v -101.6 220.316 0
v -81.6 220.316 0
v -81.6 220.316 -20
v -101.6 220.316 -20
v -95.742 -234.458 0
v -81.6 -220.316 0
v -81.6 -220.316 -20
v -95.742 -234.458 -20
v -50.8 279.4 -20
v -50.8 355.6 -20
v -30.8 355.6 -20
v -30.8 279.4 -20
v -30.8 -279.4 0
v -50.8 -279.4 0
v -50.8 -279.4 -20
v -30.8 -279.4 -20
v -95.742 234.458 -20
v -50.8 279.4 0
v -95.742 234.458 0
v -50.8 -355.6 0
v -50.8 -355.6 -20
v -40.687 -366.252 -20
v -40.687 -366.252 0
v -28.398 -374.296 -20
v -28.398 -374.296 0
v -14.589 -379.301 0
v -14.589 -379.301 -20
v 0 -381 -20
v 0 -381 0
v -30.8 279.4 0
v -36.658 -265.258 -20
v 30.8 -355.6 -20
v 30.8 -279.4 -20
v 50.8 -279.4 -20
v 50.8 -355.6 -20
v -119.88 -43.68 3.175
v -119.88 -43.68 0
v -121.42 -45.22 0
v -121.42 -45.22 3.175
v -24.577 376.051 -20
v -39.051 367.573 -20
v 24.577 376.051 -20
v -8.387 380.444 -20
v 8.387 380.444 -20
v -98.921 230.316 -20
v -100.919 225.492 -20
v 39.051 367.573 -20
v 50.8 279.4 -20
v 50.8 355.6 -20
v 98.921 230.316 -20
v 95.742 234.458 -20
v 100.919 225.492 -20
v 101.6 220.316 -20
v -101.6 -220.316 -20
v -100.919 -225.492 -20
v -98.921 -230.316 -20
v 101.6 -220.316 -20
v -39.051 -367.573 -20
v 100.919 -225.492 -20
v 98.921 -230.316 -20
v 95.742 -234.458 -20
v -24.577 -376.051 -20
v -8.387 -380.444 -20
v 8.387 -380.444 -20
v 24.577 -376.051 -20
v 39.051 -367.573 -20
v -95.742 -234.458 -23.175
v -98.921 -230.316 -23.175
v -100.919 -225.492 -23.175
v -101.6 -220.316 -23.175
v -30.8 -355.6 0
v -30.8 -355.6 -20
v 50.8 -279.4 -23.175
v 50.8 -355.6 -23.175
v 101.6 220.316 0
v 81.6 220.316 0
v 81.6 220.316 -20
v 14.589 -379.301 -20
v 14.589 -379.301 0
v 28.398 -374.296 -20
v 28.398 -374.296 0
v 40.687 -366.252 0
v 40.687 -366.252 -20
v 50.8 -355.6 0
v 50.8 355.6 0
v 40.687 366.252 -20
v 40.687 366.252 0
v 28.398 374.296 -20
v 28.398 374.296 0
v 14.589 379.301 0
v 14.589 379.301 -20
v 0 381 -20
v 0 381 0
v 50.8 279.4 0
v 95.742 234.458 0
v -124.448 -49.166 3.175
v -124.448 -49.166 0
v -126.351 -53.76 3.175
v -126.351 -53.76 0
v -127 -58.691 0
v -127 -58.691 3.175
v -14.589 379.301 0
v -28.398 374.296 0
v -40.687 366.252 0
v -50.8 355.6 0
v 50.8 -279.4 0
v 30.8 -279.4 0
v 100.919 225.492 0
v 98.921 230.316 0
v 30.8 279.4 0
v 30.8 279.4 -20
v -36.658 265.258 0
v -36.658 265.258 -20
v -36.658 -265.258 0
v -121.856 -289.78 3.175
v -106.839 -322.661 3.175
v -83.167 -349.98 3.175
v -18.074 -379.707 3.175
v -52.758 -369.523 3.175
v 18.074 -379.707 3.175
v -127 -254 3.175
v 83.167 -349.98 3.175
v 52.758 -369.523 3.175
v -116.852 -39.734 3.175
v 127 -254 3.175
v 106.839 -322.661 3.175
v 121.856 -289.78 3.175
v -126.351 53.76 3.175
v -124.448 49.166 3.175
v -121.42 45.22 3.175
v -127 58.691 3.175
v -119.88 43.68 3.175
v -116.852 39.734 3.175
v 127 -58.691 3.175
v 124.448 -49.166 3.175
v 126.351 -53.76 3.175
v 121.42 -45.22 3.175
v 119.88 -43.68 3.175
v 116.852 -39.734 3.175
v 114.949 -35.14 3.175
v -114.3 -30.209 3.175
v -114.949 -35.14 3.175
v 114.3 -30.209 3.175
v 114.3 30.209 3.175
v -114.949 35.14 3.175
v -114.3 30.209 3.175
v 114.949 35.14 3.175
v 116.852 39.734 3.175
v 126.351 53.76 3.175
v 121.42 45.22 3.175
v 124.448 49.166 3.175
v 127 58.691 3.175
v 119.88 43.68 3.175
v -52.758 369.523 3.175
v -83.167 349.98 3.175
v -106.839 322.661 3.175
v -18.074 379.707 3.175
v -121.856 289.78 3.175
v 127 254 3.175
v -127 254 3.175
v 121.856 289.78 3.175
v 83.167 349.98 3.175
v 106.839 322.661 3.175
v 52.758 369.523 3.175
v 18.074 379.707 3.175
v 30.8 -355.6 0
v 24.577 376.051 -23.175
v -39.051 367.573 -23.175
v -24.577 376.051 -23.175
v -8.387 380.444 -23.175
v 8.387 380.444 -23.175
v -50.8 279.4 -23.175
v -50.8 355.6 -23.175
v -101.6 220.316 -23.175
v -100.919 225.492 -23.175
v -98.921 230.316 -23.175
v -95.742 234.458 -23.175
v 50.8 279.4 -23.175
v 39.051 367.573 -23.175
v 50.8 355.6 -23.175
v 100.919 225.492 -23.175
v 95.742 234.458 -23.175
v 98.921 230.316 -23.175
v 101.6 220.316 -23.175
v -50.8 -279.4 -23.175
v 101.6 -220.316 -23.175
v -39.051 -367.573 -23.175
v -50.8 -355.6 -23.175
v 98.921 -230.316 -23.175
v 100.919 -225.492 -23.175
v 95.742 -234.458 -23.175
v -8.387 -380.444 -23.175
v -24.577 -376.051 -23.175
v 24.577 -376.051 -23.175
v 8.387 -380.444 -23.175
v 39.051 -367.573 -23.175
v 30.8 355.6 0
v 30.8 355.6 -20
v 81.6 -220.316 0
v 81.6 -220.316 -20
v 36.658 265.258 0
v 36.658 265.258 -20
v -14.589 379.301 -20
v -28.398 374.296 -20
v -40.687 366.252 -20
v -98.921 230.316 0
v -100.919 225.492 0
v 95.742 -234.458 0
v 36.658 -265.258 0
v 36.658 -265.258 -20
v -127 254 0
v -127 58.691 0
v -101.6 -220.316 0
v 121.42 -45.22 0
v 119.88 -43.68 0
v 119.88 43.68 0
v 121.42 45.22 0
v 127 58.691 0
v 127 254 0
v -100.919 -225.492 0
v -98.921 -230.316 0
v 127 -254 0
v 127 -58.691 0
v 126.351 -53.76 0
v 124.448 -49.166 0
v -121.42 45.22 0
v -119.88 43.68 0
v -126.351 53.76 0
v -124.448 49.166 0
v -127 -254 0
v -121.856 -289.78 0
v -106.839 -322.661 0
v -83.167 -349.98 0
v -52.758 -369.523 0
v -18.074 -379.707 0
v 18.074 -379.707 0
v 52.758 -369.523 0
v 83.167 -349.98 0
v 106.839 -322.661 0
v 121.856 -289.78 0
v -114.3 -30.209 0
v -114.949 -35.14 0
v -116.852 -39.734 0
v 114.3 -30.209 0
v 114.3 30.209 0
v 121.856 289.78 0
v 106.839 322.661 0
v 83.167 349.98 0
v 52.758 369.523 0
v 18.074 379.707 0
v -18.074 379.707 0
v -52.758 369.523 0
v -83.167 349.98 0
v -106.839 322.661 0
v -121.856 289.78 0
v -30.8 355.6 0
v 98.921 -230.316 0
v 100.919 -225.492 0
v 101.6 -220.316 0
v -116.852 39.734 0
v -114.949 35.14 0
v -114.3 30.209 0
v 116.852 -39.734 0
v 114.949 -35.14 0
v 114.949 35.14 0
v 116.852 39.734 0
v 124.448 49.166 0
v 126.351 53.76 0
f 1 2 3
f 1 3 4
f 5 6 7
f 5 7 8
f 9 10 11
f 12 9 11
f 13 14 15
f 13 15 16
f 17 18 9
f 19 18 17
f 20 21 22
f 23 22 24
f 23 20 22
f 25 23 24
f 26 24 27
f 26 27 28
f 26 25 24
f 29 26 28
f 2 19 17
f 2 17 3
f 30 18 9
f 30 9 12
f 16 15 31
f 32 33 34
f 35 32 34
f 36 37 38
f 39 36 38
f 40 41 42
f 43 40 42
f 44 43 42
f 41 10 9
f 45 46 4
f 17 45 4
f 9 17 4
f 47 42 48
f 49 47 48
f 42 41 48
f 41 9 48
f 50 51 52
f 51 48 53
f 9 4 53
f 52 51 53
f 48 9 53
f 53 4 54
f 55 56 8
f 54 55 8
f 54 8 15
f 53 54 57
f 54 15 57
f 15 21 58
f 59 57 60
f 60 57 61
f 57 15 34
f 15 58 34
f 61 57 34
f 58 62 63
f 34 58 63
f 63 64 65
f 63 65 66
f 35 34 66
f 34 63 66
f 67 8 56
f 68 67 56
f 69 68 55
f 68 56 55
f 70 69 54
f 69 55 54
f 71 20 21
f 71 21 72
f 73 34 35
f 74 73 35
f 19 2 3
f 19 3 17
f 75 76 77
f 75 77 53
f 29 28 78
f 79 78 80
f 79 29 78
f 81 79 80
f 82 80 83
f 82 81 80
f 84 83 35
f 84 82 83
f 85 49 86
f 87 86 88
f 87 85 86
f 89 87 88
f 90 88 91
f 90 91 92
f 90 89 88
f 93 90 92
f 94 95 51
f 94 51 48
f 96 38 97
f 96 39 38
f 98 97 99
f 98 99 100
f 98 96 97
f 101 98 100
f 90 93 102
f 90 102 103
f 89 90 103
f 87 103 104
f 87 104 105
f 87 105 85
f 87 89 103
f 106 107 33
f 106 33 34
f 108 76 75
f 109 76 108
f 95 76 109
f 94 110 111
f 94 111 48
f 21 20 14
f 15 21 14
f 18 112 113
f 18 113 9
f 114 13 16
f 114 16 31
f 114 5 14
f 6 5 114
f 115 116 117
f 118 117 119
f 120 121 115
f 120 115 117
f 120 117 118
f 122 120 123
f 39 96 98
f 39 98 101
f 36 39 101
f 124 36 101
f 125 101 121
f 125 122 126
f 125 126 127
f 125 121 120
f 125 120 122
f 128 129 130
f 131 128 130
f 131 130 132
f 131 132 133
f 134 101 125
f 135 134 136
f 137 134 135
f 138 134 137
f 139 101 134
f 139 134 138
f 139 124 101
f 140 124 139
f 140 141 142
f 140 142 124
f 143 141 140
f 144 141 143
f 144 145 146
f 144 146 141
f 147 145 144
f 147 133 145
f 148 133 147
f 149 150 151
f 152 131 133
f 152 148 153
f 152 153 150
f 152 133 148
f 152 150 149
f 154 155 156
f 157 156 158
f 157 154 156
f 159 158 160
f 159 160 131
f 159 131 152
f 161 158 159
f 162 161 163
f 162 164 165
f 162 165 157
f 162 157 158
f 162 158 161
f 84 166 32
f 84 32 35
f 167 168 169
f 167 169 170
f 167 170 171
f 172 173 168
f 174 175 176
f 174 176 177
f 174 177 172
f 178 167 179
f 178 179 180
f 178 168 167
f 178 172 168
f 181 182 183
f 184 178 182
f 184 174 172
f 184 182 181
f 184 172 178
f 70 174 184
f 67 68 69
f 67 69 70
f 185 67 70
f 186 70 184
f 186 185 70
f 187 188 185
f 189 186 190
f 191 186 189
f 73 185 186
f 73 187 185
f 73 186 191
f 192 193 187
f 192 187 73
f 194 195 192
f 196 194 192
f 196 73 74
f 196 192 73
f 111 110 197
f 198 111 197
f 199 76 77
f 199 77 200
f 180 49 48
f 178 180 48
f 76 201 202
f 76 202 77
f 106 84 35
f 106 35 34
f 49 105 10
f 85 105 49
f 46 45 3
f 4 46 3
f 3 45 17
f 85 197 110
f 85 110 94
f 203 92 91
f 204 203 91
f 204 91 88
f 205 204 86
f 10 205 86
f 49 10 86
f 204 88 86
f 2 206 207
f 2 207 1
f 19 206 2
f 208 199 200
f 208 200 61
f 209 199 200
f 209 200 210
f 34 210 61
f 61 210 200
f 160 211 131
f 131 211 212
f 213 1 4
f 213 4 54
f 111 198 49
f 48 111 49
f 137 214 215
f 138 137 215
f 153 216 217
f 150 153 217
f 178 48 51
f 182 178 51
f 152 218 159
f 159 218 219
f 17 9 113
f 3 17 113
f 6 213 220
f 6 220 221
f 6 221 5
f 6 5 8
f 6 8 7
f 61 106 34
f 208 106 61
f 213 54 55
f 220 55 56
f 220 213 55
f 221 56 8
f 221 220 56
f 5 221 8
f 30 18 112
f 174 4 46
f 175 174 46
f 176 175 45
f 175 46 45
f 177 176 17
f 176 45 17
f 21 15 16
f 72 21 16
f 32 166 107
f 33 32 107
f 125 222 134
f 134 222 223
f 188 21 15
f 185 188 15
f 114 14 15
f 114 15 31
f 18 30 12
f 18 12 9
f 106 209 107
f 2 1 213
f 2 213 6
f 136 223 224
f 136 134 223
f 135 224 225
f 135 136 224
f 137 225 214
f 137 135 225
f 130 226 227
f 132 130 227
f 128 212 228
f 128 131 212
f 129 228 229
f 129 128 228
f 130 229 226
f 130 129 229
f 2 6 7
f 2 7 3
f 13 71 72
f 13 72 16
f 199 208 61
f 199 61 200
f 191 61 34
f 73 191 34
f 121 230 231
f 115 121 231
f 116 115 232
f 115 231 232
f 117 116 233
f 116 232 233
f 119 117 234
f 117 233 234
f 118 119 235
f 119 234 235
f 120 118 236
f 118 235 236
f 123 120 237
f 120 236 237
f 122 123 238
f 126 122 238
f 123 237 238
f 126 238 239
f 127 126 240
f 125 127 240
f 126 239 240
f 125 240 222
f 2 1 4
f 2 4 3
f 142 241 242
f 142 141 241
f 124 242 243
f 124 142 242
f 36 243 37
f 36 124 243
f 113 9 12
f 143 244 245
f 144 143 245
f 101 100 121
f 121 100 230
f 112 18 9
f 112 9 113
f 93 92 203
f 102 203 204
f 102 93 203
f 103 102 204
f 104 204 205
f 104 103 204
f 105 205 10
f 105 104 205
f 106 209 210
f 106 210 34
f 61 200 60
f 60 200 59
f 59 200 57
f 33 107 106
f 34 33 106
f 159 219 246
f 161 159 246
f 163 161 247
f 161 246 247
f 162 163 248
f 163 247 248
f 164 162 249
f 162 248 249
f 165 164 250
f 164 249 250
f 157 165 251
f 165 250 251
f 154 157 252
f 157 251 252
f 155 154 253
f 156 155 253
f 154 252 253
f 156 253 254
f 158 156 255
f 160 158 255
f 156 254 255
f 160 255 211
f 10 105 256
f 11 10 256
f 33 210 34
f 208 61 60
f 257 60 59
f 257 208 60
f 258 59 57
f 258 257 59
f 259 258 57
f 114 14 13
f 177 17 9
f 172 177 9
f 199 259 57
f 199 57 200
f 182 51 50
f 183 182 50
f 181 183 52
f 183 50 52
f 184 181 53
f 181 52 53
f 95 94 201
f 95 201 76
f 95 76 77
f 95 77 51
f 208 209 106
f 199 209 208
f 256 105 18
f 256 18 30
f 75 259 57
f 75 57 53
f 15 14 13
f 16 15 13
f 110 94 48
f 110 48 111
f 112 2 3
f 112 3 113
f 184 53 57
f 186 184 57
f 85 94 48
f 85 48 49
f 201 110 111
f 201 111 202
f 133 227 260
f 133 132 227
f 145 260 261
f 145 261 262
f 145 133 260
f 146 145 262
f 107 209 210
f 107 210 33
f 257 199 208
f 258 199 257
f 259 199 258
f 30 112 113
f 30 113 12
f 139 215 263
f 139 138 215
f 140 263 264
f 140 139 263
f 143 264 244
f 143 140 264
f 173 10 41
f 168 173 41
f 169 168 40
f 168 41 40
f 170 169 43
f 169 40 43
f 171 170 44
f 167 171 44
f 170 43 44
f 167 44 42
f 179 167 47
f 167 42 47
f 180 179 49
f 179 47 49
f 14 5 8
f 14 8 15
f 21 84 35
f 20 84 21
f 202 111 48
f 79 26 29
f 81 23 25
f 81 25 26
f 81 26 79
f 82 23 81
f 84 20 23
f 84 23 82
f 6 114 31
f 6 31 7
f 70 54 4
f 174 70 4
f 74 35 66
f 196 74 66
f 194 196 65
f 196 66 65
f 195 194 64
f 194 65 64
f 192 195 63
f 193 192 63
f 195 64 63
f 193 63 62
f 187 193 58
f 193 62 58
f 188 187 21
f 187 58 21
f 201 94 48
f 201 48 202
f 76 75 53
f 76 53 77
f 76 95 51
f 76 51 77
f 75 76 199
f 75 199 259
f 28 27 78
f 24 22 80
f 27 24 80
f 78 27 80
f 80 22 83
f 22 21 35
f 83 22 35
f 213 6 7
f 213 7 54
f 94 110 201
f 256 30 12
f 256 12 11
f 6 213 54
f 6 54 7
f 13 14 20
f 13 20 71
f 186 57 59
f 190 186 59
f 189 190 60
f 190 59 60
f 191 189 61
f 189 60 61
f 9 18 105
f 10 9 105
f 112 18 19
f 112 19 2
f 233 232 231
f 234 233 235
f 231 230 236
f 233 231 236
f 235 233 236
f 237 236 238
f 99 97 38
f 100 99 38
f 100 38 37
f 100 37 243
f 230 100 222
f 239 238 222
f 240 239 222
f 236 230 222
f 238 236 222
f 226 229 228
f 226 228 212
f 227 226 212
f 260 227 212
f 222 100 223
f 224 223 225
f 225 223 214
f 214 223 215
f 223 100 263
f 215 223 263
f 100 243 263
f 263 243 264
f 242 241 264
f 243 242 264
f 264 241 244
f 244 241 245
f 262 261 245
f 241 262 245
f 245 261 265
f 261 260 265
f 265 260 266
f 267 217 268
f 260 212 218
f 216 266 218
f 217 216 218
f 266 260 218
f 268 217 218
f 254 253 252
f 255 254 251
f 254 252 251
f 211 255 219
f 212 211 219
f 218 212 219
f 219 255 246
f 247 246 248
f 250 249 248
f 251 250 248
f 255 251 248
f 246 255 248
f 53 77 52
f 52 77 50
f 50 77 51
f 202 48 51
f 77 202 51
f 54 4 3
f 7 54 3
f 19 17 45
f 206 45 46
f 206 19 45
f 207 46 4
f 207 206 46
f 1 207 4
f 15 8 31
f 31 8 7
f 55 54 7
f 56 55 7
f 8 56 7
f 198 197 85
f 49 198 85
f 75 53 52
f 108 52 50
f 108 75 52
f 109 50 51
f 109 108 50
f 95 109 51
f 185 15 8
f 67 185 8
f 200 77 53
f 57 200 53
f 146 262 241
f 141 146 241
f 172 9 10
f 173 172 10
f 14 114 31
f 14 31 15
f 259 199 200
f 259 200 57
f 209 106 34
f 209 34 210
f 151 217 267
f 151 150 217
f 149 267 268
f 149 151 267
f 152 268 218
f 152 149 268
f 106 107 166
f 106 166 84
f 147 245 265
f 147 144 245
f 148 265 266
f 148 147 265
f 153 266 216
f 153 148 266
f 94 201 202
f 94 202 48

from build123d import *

# Parameters (mm, degrees)
F0_W     = 20
F0_H     = 76.2
F1_DEPTH = 3.175
F2_DEPTH = 20
F3_DEPTH = 20
F4_R     = 19.05
F5_W     = 20
F5_H     = 76.2
F6_DEPTH = 3.175


with BuildPart() as f1:
    # F0 (on Top) → F1 (new body)
    with BuildSketch(Plane.XY):
        with BuildLine():
            ThreePointArc((0, 381), (-28.3980633142, 374.2961266285), (-50.8, 355.6))
            Line((-50.8, 355.6), (-30.8, 355.6))
            Line((-30.8, 355.6), (30.8, 355.6))
            Line((30.8, 355.6), (50.8, 355.6))
            ThreePointArc((50.8, 355.6), (28.3980633142, 374.2961266285), (0, 381))
        make_face()
        with BuildLine():
            Line((-50.8, 279.4), (-50.8, 355.6))
            ThreePointArc((-50.8, 355.6), (-28.3980633142, 374.2961266285), (0, 381))
            ThreePointArc((0, 381), (-89.8025612107, 343.8025612107), (-127, 254))
            Line((-127, 254), (-127, 50.8))
            Line((-127, 50.8), (-114.3, 38.1))
            Line((-114.3, 38.1), (-114.3, 0))
            Line((-114.3, 0), (-114.3, -38.1))
            Line((-114.3, -38.1), (-127, -50.8))
            Line((-127, -50.8), (-127, -254))
            ThreePointArc((-127, -254), (-89.8025612107, -343.8025612107), (0, -381))
            ThreePointArc((0, -381), (-28.3980633142, -374.2961266285), (-50.8, -355.6))
            Line((-50.8, -355.6), (-50.8, -279.4))
            Line((-50.8, -279.4), (-95.7421356237, -234.4578643763))
            ThreePointArc((-95.7421356237, -234.4578643763), (-100.0775906502, -227.9693973998), (-101.6, -220.3157287525))
            Line((-101.6, -220.3157287525), (-101.6, 0))
            Line((-101.6, 0), (-101.6, 220.3157287525))
            ThreePointArc((-101.6, 220.3157287525), (-100.0775906502, 227.9693973998), (-95.7421356237, 234.4578643763))
            Line((-95.7421356237, 234.4578643763), (-50.8, 279.4))
        make_face()
        with BuildLine():
            ThreePointArc((127, 254), (89.8025612107, 343.8025612107), (0, 381))
            ThreePointArc((0, 381), (28.3980633142, 374.2961266285), (50.8, 355.6))
            Line((50.8, 355.6), (50.8, 279.4))
            Line((50.8, 279.4), (95.7421356237, 234.4578643763))
            ThreePointArc((95.7421356237, 234.4578643763), (100.0775906502, 227.9693973998), (101.6, 220.3157287525))
            Line((101.6, 220.3157287525), (101.6, 0))
            Line((101.6, 0), (101.6, -220.3157287525))
            ThreePointArc((101.6, -220.3157287525), (100.0775906502, -227.9693973998), (95.7421356237, -234.4578643763))
            Line((95.7421356237, -234.4578643763), (50.8, -279.4))
            Line((50.8, -279.4), (50.8, -355.6))
            ThreePointArc((50.8, -355.6), (28.3980633142, -374.2961266285), (0, -381))
            ThreePointArc((0, -381), (89.8025612107, -343.8025612107), (127, -254))
            Line((127, -254), (127, -50.8))
            Line((127, -50.8), (114.3, -38.1))
            Line((114.3, -38.1), (114.3, 0))
            Line((114.3, 0), (114.3, 38.1))
            Line((114.3, 38.1), (127, 50.8))
            Line((127, 50.8), (127, 254))
        make_face()
        with BuildLine():
            Line((-30.8, -355.6), (-50.8, -355.6))
            ThreePointArc((-50.8, -355.6), (-28.3980633142, -374.2961266285), (0, -381))
            ThreePointArc((0, -381), (28.3980633142, -374.2961266285), (50.8, -355.6))
            Line((50.8, -355.6), (30.8, -355.6))
            Line((30.8, -355.6), (-30.8, -355.6))
        make_face()
        Polygon((30.8, 355.6), (-30.8, 355.6), (-30.8, 279.4), (-36.6578643763, 265.2578643763), (-81.6, 220.3157287525), (-81.6, 0), (-81.6, -220.3157287525), (-36.6578643763, -265.2578643763), (-30.8, -279.4), (-30.8, -355.6), (30.8, -355.6), (30.8, -279.4), (36.6578643763, -265.2578643763), (81.6, -220.3157287525), (81.6, 0), (81.6, 220.3157287525), (36.6578643763, 265.2578643763), (30.8, 279.4), align=None)
        with Locations((-40.8, 317.5)):
            Rectangle(F0_W, F0_H)
        Polygon((-30.8, 279.4), (-50.8, 279.4), (-36.6578643763, 265.2578643763), align=None)
        Polygon((-36.6578643763, 265.2578643763), (-50.8, 279.4), (-95.7421356237, 234.4578643763), (-81.6, 220.3157287525), align=None)
        with BuildLine():
            Line((-81.6, 220.3157287525), (-95.7421356237, 234.4578643763))
            ThreePointArc((-95.7421356237, 234.4578643763), (-100.0775906502, 227.9693973998), (-101.6, 220.3157287525))
            Line((-101.6, 220.3157287525), (-81.6, 220.3157287525))
        make_face()
        with Locations((40.8, 317.5)):
            Rectangle(F0_W, F0_H)
        Polygon((50.8, 279.4), (30.8, 279.4), (36.6578643763, 265.2578643763), align=None)
        Polygon((95.7421356237, 234.4578643763), (50.8, 279.4), (36.6578643763, 265.2578643763), (81.6, 220.3157287525), align=None)
        with BuildLine():
            ThreePointArc((101.6, 220.3157287525), (100.0775906502, 227.9693973998), (95.7421356237, 234.4578643763))
            Line((95.7421356237, 234.4578643763), (81.6, 220.3157287525))
            Line((81.6, 220.3157287525), (101.6, 220.3157287525))
        make_face()
        with BuildLine():
            Line((-95.7421356237, -234.4578643763), (-81.6, -220.3157287525))
            Line((-81.6, -220.3157287525), (-101.6, -220.3157287525))
            ThreePointArc((-101.6, -220.3157287525), (-100.0775906502, -227.9693973998), (-95.7421356237, -234.4578643763))
        make_face()
        Polygon((-36.6578643763, -265.2578643763), (-81.6, -220.3157287525), (-95.7421356237, -234.4578643763), (-50.8, -279.4), align=None)
        Polygon((-30.8, -279.4), (-36.6578643763, -265.2578643763), (-50.8, -279.4), align=None)
        with Locations((-40.8, -317.5)):
            Rectangle(F0_W, F0_H)
        with Locations((40.8, -317.5)):
            Rectangle(F0_W, F0_H)
        Polygon((50.8, -279.4), (36.6578643763, -265.2578643763), (30.8, -279.4), align=None)
        Polygon((95.7421356237, -234.4578643763), (81.6, -220.3157287525), (36.6578643763, -265.2578643763), (50.8, -279.4), align=None)
        with BuildLine():
            Line((101.6, -220.3157287525), (81.6, -220.3157287525))
            Line((81.6, -220.3157287525), (95.7421356237, -234.4578643763))
            ThreePointArc((95.7421356237, -234.4578643763), (100.0775906502, -227.9693973998), (101.6, -220.3157287525))
        make_face()
        Polygon((-81.6, 0), (-81.6, 220.3157287525), (-101.6, 220.3157287525), (-101.6, 0), (-101.6, -220.3157287525), (-81.6, -220.3157287525), align=None)
        Polygon((101.6, 220.3157287525), (81.6, 220.3157287525), (81.6, 0), (81.6, -220.3157287525), (101.6, -220.3157287525), (101.6, 0), align=None)
    extrude(amount=F1_DEPTH)

    # F4
    f4_edges = [f1.edges().sort_by_distance(p)[0] for p in [
        (127, -50.8, 1.5875),
        (114.3, -38.1, 1.5875),
        (114.3, 38.1, 1.5875),
        (127, 50.8, 1.5875),
        (-127, -50.8, 1.5875),
        (-114.3, -38.1, 1.5875),
        (-114.3, 38.1, 1.5875),
        (-127, 50.8, 1.5875),
    ]]
    fillet(f4_edges, radius=F4_R)


with BuildPart() as f2:
    # F0 (on Top) → F2 (new body)
    with BuildSketch(Plane.XY):
        with Locations((-40.8, 317.5)):
            Rectangle(F0_W, F0_H)
    extrude(amount=-F2_DEPTH)


with BuildPart() as f2b:
    # F0 (on Top) → F2, piece 2 (new body)
    with BuildSketch(Plane.XY):
        with Locations((40.8, 317.5)):
            Rectangle(F0_W, F0_H)
    extrude(amount=-F2_DEPTH)


with BuildPart() as f2c:
    # F0 (on Top) → F2, piece 3 (new body)
    with BuildSketch(Plane.XY):
        Polygon((95.7421356237, 234.4578643763), (50.8, 279.4), (36.6578643763, 265.2578643763), (81.6, 220.3157287525), align=None)
    extrude(amount=-F2_DEPTH)


with BuildPart() as f2d:
    # F0 (on Top) → F2, piece 4 (new body)
    with BuildSketch(Plane.XY):
        Polygon((-36.6578643763, 265.2578643763), (-50.8, 279.4), (-95.7421356237, 234.4578643763), (-81.6, 220.3157287525), align=None)
    extrude(amount=-F2_DEPTH)


with BuildPart() as f2e:
    # F0 (on Top) → F2, piece 5 (new body)
    with BuildSketch(Plane.XY):
        Polygon((-81.6, 0), (-81.6, 220.3157287525), (-101.6, 220.3157287525), (-101.6, 0), (-101.6, -220.3157287525), (-81.6, -220.3157287525), align=None)
    extrude(amount=-F2_DEPTH)


with BuildPart() as f2f:
    # F0 (on Top) → F2, piece 6 (new body)
    with BuildSketch(Plane.XY):
        Polygon((101.6, 220.3157287525), (81.6, 220.3157287525), (81.6, 0), (81.6, -220.3157287525), (101.6, -220.3157287525), (101.6, 0), align=None)
    extrude(amount=-F2_DEPTH)


with BuildPart() as f2g:
    # F0 (on Top) → F2, piece 7 (new body)
    with BuildSketch(Plane.XY):
        Polygon((-36.6578643763, -265.2578643763), (-81.6, -220.3157287525), (-95.7421356237, -234.4578643763), (-50.8, -279.4), align=None)
    extrude(amount=-F2_DEPTH)


with BuildPart() as f2h:
    # F0 (on Top) → F2, piece 8 (new body)
    with BuildSketch(Plane.XY):
        Polygon((95.7421356237, -234.4578643763), (81.6, -220.3157287525), (36.6578643763, -265.2578643763), (50.8, -279.4), align=None)
    extrude(amount=-F2_DEPTH)


with BuildPart() as f2i:
    # F0 (on Top) → F2, piece 9 (new body)
    with BuildSketch(Plane.XY):
        with Locations((40.8, -317.5)):
            Rectangle(F0_W, F0_H)
    extrude(amount=-F2_DEPTH)


with BuildPart() as f2j:
    # F0 (on Top) → F2, piece 10 (new body)
    with BuildSketch(Plane.XY):
        with Locations((-40.8, -317.5)):
            Rectangle(F0_W, F0_H)
    extrude(amount=-F2_DEPTH)


with BuildPart() as f3:
    # F0 (on Top) → F3 (new body)
    with BuildSketch(Plane.XY):
        with BuildLine():
            ThreePointArc((0, 381), (-28.3980633142, 374.2961266285), (-50.8, 355.6))
            Line((-50.8, 355.6), (-30.8, 355.6))
            Line((-30.8, 355.6), (30.8, 355.6))
            Line((30.8, 355.6), (50.8, 355.6))
            ThreePointArc((50.8, 355.6), (28.3980633142, 374.2961266285), (0, 381))
        make_face()
    extrude(amount=-F3_DEPTH)


with BuildPart() as f3b:
    # F0 (on Top) → F3, piece 2 (new body)
    with BuildSketch(Plane.XY):
        Polygon((50.8, 279.4), (30.8, 279.4), (36.6578643763, 265.2578643763), align=None)
    extrude(amount=-F3_DEPTH)


with BuildPart() as f3c:
    # F0 (on Top) → F3, piece 3 (new body)
    with BuildSketch(Plane.XY):
        with BuildLine():
            ThreePointArc((101.6, 220.3157287525), (100.0775906502, 227.9693973998), (95.7421356237, 234.4578643763))
            Line((95.7421356237, 234.4578643763), (81.6, 220.3157287525))
            Line((81.6, 220.3157287525), (101.6, 220.3157287525))
        make_face()
    extrude(amount=-F3_DEPTH)


with BuildPart() as f3d:
    # F0 (on Top) → F3, piece 4 (new body)
    with BuildSketch(Plane.XY):
        with BuildLine():
            Line((-81.6, 220.3157287525), (-95.7421356237, 234.4578643763))
            ThreePointArc((-95.7421356237, 234.4578643763), (-100.0775906502, 227.9693973998), (-101.6, 220.3157287525))
            Line((-101.6, 220.3157287525), (-81.6, 220.3157287525))
        make_face()
    extrude(amount=-F3_DEPTH)


with BuildPart() as f3e:
    # F0 (on Top) → F3, piece 5 (new body)
    with BuildSketch(Plane.XY):
        Polygon((-30.8, 279.4), (-50.8, 279.4), (-36.6578643763, 265.2578643763), align=None)
    extrude(amount=-F3_DEPTH)


with BuildPart() as f3f:
    # F0 (on Top) → F3, piece 6 (new body)
    with BuildSketch(Plane.XY):
        with BuildLine():
            Line((101.6, -220.3157287525), (81.6, -220.3157287525))
            Line((81.6, -220.3157287525), (95.7421356237, -234.4578643763))
            ThreePointArc((95.7421356237, -234.4578643763), (100.0775906502, -227.9693973998), (101.6, -220.3157287525))
        make_face()
    extrude(amount=-F3_DEPTH)


with BuildPart() as f3g:
    # F0 (on Top) → F3, piece 7 (new body)
    with BuildSketch(Plane.XY):
        with BuildLine():
            Line((-30.8, -355.6), (-50.8, -355.6))
            ThreePointArc((-50.8, -355.6), (-28.3980633142, -374.2961266285), (0, -381))
            ThreePointArc((0, -381), (28.3980633142, -374.2961266285), (50.8, -355.6))
            Line((50.8, -355.6), (30.8, -355.6))
            Line((30.8, -355.6), (-30.8, -355.6))
        make_face()
    extrude(amount=-F3_DEPTH)


with BuildPart() as f3h:
    # F0 (on Top) → F3, piece 8 (new body)
    with BuildSketch(Plane.XY):
        Polygon((50.8, -279.4), (36.6578643763, -265.2578643763), (30.8, -279.4), align=None)
    extrude(amount=-F3_DEPTH)


with BuildPart() as f3i:
    # F0 (on Top) → F3, piece 9 (new body)
    with BuildSketch(Plane.XY):
        Polygon((-30.8, -279.4), (-36.6578643763, -265.2578643763), (-50.8, -279.4), align=None)
    extrude(amount=-F3_DEPTH)


with BuildPart() as f3j:
    # F0 (on Top) → F3, piece 10 (new body)
    with BuildSketch(Plane.XY):
        with BuildLine():
            Line((-95.7421356237, -234.4578643763), (-81.6, -220.3157287525))
            Line((-81.6, -220.3157287525), (-101.6, -220.3157287525))
            ThreePointArc((-101.6, -220.3157287525), (-100.0775906502, -227.9693973998), (-95.7421356237, -234.4578643763))
        make_face()
    extrude(amount=-F3_DEPTH)


with BuildPart() as f6:
    # F5 (on face) → F6 (new body)
    with BuildSketch(Plane(origin=(0, 0, -20), x_dir=(1, 0, 0), z_dir=(0, 0, -1))):
        with BuildLine():
            ThreePointArc((-50.8, -355.6), (0, -381), (50.8, -355.6))
            Line((50.8, -355.6), (30.8, -355.6))
            Line((30.8, -355.6), (30.8, -279.4))
            Line((30.8, -279.4), (50.8, -279.4))
            Line((50.8, -279.4), (95.7421356237, -234.4578643763))
            ThreePointArc((95.7421356237, -234.4578643763), (100.0775906502, -227.9693973998), (101.6, -220.3157287525))
            Line((101.6, -220.3157287525), (101.6, 220.3157287525))
            ThreePointArc((101.6, 220.3157287525), (100.0775906502, 227.9693973998), (95.7421356237, 234.4578643763))
            Line((95.7421356237, 234.4578643763), (50.8, 279.4))
            Line((50.8, 279.4), (50.8, 355.6))
            ThreePointArc((50.8, 355.6), (0, 381), (-50.8, 355.6))
            Line((-50.8, 355.6), (-50.8, 279.4))
            Line((-50.8, 279.4), (-95.7421356237, 234.4578643763))
            ThreePointArc((-95.7421356237, 234.4578643763), (-100.0775906502, 227.9693973998), (-101.6, 220.3157287525))
            Line((-101.6, 220.3157287525), (-101.6, -220.3157287525))
            ThreePointArc((-101.6, -220.3157287525), (-100.0775906502, -227.9693973998), (-95.7421356237, -234.4578643763))
            Line((-95.7421356237, -234.4578643763), (-50.8, -279.4))
            Line((-50.8, -279.4), (-50.8, -355.6))
        make_face()
        with Locations((40.8, -317.5)):
            Rectangle(F5_W, F5_H)
    extrude(amount=F6_DEPTH)


solid = Compound([f1.part, f2.part, f2b.part, f2c.part, f2d.part, f2e.part, f2f.part, f2g.part, f2h.part, f2i.part, f2j.part, f3.part, f3b.part, f3c.part, f3d.part, f3e.part, f3f.part, f3g.part, f3h.part, f3i.part, f3j.part, f6.part])
